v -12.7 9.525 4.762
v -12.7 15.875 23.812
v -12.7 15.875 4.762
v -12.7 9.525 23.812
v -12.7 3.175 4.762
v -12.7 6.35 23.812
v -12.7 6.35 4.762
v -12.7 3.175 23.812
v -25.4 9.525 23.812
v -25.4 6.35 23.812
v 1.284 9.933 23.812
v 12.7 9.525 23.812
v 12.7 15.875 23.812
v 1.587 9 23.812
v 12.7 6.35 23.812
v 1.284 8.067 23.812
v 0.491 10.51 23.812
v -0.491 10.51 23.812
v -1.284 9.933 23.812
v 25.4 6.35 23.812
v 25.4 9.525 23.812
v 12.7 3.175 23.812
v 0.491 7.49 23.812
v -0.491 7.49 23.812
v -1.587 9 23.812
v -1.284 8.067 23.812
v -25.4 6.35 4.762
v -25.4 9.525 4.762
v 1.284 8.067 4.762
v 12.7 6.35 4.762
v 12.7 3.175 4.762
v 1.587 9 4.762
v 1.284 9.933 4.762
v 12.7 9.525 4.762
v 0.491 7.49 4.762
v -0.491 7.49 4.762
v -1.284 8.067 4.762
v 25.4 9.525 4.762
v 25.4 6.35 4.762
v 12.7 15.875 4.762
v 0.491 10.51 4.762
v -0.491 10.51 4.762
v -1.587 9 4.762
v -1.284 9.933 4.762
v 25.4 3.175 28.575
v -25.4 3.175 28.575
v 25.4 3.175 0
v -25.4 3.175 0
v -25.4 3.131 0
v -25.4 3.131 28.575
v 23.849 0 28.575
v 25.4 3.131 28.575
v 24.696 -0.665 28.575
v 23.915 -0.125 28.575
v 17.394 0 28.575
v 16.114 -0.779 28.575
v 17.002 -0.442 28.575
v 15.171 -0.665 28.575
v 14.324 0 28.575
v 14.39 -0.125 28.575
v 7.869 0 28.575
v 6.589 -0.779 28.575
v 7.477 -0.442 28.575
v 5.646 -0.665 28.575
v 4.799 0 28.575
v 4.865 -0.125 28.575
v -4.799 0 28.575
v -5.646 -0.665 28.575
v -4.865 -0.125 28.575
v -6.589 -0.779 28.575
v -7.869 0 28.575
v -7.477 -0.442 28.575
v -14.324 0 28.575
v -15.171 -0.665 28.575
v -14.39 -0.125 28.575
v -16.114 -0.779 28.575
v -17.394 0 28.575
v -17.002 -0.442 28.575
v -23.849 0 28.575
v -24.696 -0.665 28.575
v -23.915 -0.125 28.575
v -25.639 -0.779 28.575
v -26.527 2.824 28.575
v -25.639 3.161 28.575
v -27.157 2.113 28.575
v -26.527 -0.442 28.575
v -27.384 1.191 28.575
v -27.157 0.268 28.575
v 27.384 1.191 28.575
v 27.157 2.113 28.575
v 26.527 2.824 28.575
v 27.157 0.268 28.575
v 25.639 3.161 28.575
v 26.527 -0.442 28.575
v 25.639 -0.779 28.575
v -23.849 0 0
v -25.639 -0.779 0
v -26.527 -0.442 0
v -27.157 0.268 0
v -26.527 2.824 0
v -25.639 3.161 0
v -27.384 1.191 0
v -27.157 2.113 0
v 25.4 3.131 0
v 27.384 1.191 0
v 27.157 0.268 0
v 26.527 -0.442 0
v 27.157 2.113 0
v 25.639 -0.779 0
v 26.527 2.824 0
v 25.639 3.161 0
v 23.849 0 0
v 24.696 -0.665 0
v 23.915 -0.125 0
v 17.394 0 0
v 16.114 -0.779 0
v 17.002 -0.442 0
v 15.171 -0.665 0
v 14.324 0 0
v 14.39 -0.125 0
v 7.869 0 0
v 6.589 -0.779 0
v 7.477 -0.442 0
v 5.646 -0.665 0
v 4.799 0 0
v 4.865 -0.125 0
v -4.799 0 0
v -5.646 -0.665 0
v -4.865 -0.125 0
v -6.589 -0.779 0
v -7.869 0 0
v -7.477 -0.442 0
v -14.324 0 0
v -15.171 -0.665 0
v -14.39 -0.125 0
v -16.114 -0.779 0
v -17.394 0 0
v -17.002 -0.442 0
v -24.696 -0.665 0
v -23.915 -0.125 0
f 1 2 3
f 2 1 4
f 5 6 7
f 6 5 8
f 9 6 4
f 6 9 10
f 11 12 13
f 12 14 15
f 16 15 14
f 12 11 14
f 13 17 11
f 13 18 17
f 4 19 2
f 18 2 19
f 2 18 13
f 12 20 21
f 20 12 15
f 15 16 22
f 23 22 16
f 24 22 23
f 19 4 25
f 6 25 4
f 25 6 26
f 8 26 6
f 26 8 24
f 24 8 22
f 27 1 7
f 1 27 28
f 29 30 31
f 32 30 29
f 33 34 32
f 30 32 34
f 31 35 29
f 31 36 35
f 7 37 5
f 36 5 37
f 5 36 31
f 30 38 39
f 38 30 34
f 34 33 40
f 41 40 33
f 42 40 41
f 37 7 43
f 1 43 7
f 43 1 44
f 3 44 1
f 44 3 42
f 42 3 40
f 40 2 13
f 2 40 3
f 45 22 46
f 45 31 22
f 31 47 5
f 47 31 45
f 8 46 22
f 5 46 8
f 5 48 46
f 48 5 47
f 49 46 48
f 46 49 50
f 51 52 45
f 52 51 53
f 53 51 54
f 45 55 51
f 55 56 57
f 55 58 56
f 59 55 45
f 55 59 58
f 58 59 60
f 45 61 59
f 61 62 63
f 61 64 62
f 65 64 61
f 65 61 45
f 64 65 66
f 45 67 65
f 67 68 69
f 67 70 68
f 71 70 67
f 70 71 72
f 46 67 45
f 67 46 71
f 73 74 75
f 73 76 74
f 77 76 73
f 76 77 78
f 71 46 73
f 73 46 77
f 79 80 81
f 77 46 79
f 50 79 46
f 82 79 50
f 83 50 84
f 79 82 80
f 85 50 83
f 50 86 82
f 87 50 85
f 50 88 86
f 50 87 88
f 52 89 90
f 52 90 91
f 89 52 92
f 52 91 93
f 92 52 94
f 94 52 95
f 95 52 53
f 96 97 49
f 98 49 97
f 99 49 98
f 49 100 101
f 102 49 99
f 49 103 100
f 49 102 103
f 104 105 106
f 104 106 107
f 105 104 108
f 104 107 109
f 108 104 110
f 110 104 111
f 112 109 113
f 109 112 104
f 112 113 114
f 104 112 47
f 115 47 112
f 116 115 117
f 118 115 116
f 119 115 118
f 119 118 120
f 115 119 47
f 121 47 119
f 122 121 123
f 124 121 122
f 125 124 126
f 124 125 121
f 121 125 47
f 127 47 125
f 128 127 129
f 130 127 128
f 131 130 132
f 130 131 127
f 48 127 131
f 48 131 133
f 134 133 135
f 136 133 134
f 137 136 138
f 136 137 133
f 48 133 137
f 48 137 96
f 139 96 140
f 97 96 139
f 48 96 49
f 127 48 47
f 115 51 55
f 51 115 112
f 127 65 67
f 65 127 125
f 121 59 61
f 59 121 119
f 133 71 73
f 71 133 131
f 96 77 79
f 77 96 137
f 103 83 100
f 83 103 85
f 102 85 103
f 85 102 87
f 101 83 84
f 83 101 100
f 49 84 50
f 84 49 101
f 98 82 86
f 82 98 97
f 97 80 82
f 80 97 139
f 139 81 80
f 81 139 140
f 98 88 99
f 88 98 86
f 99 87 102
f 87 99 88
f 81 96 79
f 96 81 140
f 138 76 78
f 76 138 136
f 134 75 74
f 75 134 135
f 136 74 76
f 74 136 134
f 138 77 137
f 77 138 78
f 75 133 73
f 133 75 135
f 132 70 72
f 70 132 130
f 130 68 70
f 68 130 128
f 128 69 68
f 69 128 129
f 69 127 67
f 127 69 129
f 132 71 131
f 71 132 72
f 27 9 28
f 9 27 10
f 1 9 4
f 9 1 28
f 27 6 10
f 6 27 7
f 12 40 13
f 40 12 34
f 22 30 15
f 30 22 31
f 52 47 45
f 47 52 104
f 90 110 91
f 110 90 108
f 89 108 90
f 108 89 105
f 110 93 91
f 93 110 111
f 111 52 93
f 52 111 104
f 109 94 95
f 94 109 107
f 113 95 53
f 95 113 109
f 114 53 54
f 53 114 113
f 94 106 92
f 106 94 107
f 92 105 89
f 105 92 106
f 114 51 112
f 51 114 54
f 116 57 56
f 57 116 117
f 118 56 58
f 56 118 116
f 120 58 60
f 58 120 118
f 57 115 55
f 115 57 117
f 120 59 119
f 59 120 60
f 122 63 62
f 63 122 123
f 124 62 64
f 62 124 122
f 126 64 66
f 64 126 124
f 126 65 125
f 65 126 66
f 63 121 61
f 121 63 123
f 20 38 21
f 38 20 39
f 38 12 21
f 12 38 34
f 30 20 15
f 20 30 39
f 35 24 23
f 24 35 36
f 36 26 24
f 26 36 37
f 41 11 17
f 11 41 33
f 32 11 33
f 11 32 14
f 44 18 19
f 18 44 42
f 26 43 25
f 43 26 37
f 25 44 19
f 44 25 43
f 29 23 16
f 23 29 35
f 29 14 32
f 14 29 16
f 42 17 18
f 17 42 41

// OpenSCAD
// file: joints.scad
/**
 * joints.scad is part of Paper Laptop project.
 * This file contains various models for joining two or
 * more pieces of flat materials together.
 *
 * @author R. S. Doiel, <rsdoiel@gmail.com>
 * copyright (c) 2016 all rights reserved
 * Released under a BSD 2-clause license
 */

// Foam board firm enough to make a case with is about
// 1/8th to 1/4th inch (6.35mm) thick. Usually sold in single sheets
// of about 20"x30".

//
// Basic models are for parts without any holes for fasteners.
//

/*
 * CornerBasic() - corner joint without fastener hole
 */
module CornerBasic() {
    u = 3.175; // Unit is 3.175mm or 1/8th inch:w
    t = 6.35; // Thickness of the 1/4th" Foam board

    // Inner block, width, depth, height
    translate([0, t, t/2]) {
        difference() {
            color([1,0,0]) cube([25.4, 25.4, 25.4]);
            translate([t*3.5,t*3.5,-1]) {
                color([1,0,1]) cylinder(h=28,r=t*1.25,center=false);
            }
        }
    }

     // Inner shell
    translate([t,2*t,t/2]) {
        color([0,1,0]) cube([50.8-t,t/2,25.4]);
        color([0,1,0]) cube([t/2,50.8-t,25.4]);
    }

    // Outer shell
    color([0,1,0]) cube([50.8,t,25.4+t]);
    translate([-t,t,0]) {
        color([0,1,0]) cube([t,50.8,25.4+t]);
    }
    // Outer corners
    translate([u*-1,u,0]) {
        color([0,1,0]) cylinder(h=25.4+t,r=1.5*u,center=false);
    }

    // Outer bumps
    translate([u*-1.25,u*18,0]) {
        color([0,1,0]) cylinder(h=25.4+t,r=1.25*u,center=false);
    }
    translate([u*-1.25,u*12,0]) {
        color([0,1,0]) cylinder(h=25.4+t,r=1.25*u,center=false);
    }
    translate([u*-1.25,u*6,0]) {
        color([0,1,0]) cylinder(h=25.4+t,r=1.25*u,center=false);
    }

    translate([u*16,u*0.75,0]) {
        color([0,1,0]) cylinder(h=25.4+t,r=1.25*u,center=false);
    }
    translate([u*10,u*0.75,0]) {
        color([0,1,0]) cylinder(h=25.4+t,r=1.25*u,center=false);
    }
    translate([u*4,u*0.75,0]) {
        color([0,1,0]) cylinder(h=25.4+t,r=1.25*u,center=false);
    }
}

//
// Corner() basic corner joint plus hole for fastener
//
module Corner() {
    // Scale down the basic corner so that the
    // for 50% width/depth, 75% of height
    scale([0.5, 0.5, 0.75]) {
        difference() {
            u = 3.175;
            CornerBasic();
            // Add a hole for screw
            translate([12,18,0]) {
                color([0,0,1]) cylinder(
                    h=25.4+(4*u),
                    r=u,
                    center=false
                );
            }
        }
    }
}

//
// EndBasic
//
module EndBasic() {
    u = 3.175; // Unit is 3.175mm or 1/8th inch:w
    t = 6.35; // Thickness of the 1/4th" Foamboard

    // Inner block, width, depth, height
    translate([0, t, t]) {
            color([1,0,0]) cube([25.4, 25.4, 25.4]);
    }
    // Outer shell
    color([0,1,0]) cube([50.8,t,25.4+(2*t)]);

    // Outer corners
    translate([u*-1,u,0]) {
        color([0,1,0]) cylinder(h=25.4+(2*t),r=1.5*u,center=false);
    }

    translate([u*16,u*0.75,0]) {
        color([0,1,0]) cylinder(h=25.4+(2*t),r=1.25*u,center=false);
    }
    translate([u*10,u*0.75,0]) {
        color([0,1,0]) cylinder(h=25.4+(2*t),r=1.25*u,center=false);
    }
    translate([u*4,u*0.75,0]) {
        color([0,1,0]) cylinder(h=25.4+(2*t),r=1.25*u,center=false);
    }

    // Inner shell
    translate([t,2*t,t]) {
        color([0,1,0]) cube([50.8-t,t,25.4]);
    }
}

//
// End() basic corner joint plus hole for fastener
//
module End() {
    // Scale down the basic corner so that the
    // for 50% width/depth, 75% of height
    scale([0.5, 0.5, 0.75]) {
        difference() {
            u = 3.175;
            EndBasic();
            // Add a hole for screw
            translate([12,18,0]) {
                color([0,0,1]) cylinder(h=25.4+(4*u),r=u,center=false);
            }
        }
    }
}

//
// SpliceBasic
//
module SpliceBasic() {
    u = 3.175; // Unit is 3.175mm or 1/8th inch:w
    t = 6.35; // Thickness of the 1/4th" Foamboard

    // Inner block (cube: [width, depth, height])
    translate([0, t, t]) {
            color([1,0,0]) cube([25.4, 25.4, 25.4]);
    }
    // Outer shell
    color([0,1,0]) cube([50.8,t,25.4+(2*t)]);

    // Outer corners
    translate([u*16,u*0.75,0]) {
        color([0,1,0]) cylinder(h=25.4+(2*t),r=1.25*u,center=false);
    }
    translate([u*10,u*0.75,0]) {
        color([0,1,0]) cylinder(h=25.4+(2*t),r=1.25*u,center=false);
    }
    translate([u*4,u*0.75,0]) {
        color([0,1,0]) cylinder(h=25.4+(2*t),r=1.25*u,center=false);
    }

    // Inner shell
    translate([t,2*t,t]) {
        color([0,1,0]) cube([50.8-t,t,25.4]);
    }

    // Mirrored shapes
    mirror(180) {
        // Inner block (cube: [width, depth, height])
        translate([0, t, t]) {
                color([1,0,0]) cube([25.4, 25.4, 25.4]);
        }
        // Outer shell
        color([0,1,0]) cube([50.8,t,25.4+(2*t)]);

        // Outer corners
        translate([u*16,u*0.75,0]) {
            color([0,1,0]) cylinder(h=25.4+(2*t),r=1.25*u,center=false);
        }
        translate([u*10,u*0.75,0]) {
            color([0,1,0]) cylinder(h=25.4+(2*t),r=1.25*u,center=false);
        }
        translate([u*4,u*0.75,0]) {
            color([0,1,0]) cylinder(h=25.4+(2*t),r=1.25*u,center=false);
        }

        // Inner shell
        translate([t,2*t,t]) {
            color([0,1,0]) cube([50.8-t,t,25.4]);
        }
    }
}

//
// Splice() basic corner joint plus hole for fastener
//
module Splice() {
    scale([0.5, 0.5, 0.75]) {
        difference() {
            u = 3.175;
            SpliceBasic();
            // Add a hole for screw
            translate([0,18,0]) {
                color([0,0,1]) cylinder(h=25.4+(4*u),r=u,center=false);
            }
        }
    }
}


// Four corner joints
module FourCornersGrouped() {
    Corner();
    translate([120,6.35,0]) {
        rotate(90) {
            Corner();
        }
    }
    translate([114, 124, 0]) {
        rotate(180) {
            Corner();
            translate([120,6.35,0]) {
                rotate(90) {
                    Corner();
                }
            }
        }
    }
}

// Two End Pieces
module TwoEndsGrouped() {
    translate([0, 0, 0]) {
        End();
    }
    translate([114, 0, 0]) {
        mirror(180) End();
    }
}

module TwoSplicesGrouped() {
    translate([58, 0, 0]) {
        Splice();
    }
    translate([58, 38, 0]) {
        Splice();
    }
}

//Corner();
//Splice();
//End();
//FourCornersGrouped();
//TwoEndsGrouped();
//TwoSplicesGrouped();
// main file
/**
 * splice.scad - print a single splice
 */
include <joints.scad>

Splice();
